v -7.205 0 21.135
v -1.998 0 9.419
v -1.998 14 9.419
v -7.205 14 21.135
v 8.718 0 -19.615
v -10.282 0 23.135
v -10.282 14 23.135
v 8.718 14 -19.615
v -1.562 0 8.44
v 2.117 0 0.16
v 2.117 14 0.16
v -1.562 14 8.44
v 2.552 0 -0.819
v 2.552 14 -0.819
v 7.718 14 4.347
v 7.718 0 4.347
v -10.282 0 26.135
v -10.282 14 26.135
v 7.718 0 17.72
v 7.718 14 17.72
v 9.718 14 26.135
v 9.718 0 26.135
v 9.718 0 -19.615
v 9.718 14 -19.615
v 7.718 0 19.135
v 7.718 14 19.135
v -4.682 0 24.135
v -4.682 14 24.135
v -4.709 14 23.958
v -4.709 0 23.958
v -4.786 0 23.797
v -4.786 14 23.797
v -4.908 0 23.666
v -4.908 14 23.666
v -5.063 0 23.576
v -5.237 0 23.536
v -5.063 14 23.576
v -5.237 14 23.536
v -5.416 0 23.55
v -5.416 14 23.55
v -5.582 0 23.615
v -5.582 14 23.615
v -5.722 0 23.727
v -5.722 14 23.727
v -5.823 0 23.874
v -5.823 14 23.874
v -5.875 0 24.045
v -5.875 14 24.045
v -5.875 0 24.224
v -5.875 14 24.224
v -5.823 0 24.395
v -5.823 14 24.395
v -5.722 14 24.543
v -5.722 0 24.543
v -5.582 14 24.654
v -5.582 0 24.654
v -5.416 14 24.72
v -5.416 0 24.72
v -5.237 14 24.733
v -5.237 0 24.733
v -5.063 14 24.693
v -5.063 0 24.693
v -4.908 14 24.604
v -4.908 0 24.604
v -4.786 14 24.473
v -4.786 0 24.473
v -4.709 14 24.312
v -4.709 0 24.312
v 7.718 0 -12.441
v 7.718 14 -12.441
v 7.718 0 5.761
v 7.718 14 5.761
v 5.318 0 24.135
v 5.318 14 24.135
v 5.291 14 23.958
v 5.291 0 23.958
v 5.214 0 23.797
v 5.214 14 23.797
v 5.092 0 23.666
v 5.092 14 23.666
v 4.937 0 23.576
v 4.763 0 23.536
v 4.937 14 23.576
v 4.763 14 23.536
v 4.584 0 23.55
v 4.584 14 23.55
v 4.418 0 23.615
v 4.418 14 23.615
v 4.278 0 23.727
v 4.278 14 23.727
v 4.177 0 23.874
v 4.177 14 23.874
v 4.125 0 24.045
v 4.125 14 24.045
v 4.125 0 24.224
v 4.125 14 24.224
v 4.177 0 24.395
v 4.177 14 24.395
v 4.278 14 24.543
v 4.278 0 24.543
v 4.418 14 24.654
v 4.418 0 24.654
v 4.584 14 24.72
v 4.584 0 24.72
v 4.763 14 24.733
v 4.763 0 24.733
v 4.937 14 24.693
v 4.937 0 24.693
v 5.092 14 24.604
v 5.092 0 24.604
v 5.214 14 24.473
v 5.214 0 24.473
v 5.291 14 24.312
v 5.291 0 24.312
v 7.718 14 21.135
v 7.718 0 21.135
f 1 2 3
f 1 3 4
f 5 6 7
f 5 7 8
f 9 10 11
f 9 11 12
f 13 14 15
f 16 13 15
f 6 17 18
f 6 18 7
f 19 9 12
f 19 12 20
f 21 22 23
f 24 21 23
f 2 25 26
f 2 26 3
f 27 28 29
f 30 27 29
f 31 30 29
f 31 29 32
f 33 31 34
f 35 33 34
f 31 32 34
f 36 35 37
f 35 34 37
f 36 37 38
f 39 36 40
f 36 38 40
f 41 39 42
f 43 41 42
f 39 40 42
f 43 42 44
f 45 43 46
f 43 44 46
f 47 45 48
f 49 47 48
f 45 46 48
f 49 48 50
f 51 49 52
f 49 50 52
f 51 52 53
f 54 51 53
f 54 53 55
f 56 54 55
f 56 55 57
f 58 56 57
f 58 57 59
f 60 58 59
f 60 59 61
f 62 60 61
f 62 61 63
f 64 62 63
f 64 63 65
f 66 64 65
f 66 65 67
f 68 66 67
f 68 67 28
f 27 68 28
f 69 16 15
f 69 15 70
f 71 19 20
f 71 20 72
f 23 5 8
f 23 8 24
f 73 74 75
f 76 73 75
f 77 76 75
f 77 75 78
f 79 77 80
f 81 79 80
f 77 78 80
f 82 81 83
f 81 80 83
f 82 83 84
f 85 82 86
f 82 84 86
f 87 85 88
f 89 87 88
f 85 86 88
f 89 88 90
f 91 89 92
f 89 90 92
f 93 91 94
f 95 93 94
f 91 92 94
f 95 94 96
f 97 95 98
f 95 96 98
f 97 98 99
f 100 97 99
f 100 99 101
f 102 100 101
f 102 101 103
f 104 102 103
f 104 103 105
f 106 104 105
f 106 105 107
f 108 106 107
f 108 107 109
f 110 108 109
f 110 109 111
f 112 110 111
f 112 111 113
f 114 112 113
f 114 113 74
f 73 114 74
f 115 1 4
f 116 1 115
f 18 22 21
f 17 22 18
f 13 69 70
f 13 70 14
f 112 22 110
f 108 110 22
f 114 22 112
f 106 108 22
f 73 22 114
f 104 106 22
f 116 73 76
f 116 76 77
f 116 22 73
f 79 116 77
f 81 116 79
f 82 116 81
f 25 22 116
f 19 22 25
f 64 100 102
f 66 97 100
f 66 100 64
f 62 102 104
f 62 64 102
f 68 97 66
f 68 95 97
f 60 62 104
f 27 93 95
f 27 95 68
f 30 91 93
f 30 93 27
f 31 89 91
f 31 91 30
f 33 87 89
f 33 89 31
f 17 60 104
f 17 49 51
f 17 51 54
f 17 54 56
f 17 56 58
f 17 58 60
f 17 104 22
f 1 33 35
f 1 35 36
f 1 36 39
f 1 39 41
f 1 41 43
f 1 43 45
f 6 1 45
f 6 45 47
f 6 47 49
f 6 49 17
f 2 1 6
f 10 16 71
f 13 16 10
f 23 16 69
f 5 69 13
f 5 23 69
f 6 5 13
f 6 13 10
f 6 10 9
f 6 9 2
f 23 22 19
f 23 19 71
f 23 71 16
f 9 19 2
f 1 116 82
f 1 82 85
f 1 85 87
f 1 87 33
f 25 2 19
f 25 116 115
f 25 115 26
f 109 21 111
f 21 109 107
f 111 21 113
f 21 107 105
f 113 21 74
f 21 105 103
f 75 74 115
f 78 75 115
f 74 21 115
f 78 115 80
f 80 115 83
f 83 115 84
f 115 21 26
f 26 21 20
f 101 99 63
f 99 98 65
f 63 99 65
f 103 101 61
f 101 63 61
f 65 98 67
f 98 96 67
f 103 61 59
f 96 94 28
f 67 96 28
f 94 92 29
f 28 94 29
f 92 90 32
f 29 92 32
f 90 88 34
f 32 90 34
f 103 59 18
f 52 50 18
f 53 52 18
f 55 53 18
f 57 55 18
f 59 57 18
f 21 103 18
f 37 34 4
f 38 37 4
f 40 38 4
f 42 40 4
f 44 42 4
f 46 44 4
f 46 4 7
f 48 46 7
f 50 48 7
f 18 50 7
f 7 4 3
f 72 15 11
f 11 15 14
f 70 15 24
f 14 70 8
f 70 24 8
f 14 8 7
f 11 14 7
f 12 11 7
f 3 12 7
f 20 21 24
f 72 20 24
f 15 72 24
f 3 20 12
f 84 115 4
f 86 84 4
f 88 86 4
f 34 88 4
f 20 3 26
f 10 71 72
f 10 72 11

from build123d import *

# Parameters (mm, degrees)
BOSS_EXTRUDE1_DEPTH   = 14
BOSS_EXTRUDE1_2_DEPTH = 14
BOSS_EXTRUDE2_DEPTH   = 14
SKETCH3_R             = 0.6
CUT_EXTRUDE1_DEPTH    = 15


with BuildPart() as part:
    # Sketch2 → Boss-Extrude1 (new body)
    with BuildSketch(Plane(origin=(0, 0, 0), x_dir=(1, 0, 0), z_dir=(0, 1, 0))):
        Polygon((7.717934448, -19.134647491), (-1.99762589, -9.419087153), (-1.562483255, -8.440016225), (7.717934448, -17.720433929), align=None)
    extrude(amount=BOSS_EXTRUDE1_DEPTH)



with BuildPart() as body_2:
    # Sketch2 → Boss-Extrude1 2 (new body)
    with BuildSketch(Plane(origin=(0, 0, 0), x_dir=(1, 0, 0), z_dir=(0, 1, 0))):
        Polygon((7.717934448, -5.761075504), (2.117319337, -0.160460393), (2.552461971, 0.818610535), (7.717934448, -4.346861942), align=None)
    extrude(amount=BOSS_EXTRUDE1_2_DEPTH)


with BuildPart() as part_1:
    add(part.part)

    add(body_2.part)  # Boss-Extrude2 merges body 2
    # Sketch1 → Boss-Extrude2 (add)
    with BuildSketch(Plane(origin=(0, 0, 0), x_dir=(1, 0, 0), z_dir=(0, 1, 0))):
        Polygon((-10.282065552, -23.134647491), (8.717934448, 19.615352509), (9.717934448, 19.615352509), (9.717934448, -23.134647491), (9.717934448, -26.134647491), (-10.282065552, -26.134647491), align=None)
        Polygon((7.717934448, -21.134647491), (7.717934448, 12.440923608), (-7.204541596, -21.134647491), align=None, mode=Mode.SUBTRACT)
    extrude(amount=BOSS_EXTRUDE2_DEPTH)

    # Sketch3 → Cut-Extrude1 (cut, through all)
    with BuildSketch(Plane(origin=(0, 14, 0), x_dir=(1, 0, 0), z_dir=(0, 1, 0))):
        with Locations((4.717934448, -24.134647491)):
            Circle(SKETCH3_R)
        with Locations((-5.282065552, -24.134647491)):
            Circle(SKETCH3_R)
    extrude(amount=-CUT_EXTRUDE1_DEPTH, mode=Mode.SUBTRACT)


solid = part_1.part
